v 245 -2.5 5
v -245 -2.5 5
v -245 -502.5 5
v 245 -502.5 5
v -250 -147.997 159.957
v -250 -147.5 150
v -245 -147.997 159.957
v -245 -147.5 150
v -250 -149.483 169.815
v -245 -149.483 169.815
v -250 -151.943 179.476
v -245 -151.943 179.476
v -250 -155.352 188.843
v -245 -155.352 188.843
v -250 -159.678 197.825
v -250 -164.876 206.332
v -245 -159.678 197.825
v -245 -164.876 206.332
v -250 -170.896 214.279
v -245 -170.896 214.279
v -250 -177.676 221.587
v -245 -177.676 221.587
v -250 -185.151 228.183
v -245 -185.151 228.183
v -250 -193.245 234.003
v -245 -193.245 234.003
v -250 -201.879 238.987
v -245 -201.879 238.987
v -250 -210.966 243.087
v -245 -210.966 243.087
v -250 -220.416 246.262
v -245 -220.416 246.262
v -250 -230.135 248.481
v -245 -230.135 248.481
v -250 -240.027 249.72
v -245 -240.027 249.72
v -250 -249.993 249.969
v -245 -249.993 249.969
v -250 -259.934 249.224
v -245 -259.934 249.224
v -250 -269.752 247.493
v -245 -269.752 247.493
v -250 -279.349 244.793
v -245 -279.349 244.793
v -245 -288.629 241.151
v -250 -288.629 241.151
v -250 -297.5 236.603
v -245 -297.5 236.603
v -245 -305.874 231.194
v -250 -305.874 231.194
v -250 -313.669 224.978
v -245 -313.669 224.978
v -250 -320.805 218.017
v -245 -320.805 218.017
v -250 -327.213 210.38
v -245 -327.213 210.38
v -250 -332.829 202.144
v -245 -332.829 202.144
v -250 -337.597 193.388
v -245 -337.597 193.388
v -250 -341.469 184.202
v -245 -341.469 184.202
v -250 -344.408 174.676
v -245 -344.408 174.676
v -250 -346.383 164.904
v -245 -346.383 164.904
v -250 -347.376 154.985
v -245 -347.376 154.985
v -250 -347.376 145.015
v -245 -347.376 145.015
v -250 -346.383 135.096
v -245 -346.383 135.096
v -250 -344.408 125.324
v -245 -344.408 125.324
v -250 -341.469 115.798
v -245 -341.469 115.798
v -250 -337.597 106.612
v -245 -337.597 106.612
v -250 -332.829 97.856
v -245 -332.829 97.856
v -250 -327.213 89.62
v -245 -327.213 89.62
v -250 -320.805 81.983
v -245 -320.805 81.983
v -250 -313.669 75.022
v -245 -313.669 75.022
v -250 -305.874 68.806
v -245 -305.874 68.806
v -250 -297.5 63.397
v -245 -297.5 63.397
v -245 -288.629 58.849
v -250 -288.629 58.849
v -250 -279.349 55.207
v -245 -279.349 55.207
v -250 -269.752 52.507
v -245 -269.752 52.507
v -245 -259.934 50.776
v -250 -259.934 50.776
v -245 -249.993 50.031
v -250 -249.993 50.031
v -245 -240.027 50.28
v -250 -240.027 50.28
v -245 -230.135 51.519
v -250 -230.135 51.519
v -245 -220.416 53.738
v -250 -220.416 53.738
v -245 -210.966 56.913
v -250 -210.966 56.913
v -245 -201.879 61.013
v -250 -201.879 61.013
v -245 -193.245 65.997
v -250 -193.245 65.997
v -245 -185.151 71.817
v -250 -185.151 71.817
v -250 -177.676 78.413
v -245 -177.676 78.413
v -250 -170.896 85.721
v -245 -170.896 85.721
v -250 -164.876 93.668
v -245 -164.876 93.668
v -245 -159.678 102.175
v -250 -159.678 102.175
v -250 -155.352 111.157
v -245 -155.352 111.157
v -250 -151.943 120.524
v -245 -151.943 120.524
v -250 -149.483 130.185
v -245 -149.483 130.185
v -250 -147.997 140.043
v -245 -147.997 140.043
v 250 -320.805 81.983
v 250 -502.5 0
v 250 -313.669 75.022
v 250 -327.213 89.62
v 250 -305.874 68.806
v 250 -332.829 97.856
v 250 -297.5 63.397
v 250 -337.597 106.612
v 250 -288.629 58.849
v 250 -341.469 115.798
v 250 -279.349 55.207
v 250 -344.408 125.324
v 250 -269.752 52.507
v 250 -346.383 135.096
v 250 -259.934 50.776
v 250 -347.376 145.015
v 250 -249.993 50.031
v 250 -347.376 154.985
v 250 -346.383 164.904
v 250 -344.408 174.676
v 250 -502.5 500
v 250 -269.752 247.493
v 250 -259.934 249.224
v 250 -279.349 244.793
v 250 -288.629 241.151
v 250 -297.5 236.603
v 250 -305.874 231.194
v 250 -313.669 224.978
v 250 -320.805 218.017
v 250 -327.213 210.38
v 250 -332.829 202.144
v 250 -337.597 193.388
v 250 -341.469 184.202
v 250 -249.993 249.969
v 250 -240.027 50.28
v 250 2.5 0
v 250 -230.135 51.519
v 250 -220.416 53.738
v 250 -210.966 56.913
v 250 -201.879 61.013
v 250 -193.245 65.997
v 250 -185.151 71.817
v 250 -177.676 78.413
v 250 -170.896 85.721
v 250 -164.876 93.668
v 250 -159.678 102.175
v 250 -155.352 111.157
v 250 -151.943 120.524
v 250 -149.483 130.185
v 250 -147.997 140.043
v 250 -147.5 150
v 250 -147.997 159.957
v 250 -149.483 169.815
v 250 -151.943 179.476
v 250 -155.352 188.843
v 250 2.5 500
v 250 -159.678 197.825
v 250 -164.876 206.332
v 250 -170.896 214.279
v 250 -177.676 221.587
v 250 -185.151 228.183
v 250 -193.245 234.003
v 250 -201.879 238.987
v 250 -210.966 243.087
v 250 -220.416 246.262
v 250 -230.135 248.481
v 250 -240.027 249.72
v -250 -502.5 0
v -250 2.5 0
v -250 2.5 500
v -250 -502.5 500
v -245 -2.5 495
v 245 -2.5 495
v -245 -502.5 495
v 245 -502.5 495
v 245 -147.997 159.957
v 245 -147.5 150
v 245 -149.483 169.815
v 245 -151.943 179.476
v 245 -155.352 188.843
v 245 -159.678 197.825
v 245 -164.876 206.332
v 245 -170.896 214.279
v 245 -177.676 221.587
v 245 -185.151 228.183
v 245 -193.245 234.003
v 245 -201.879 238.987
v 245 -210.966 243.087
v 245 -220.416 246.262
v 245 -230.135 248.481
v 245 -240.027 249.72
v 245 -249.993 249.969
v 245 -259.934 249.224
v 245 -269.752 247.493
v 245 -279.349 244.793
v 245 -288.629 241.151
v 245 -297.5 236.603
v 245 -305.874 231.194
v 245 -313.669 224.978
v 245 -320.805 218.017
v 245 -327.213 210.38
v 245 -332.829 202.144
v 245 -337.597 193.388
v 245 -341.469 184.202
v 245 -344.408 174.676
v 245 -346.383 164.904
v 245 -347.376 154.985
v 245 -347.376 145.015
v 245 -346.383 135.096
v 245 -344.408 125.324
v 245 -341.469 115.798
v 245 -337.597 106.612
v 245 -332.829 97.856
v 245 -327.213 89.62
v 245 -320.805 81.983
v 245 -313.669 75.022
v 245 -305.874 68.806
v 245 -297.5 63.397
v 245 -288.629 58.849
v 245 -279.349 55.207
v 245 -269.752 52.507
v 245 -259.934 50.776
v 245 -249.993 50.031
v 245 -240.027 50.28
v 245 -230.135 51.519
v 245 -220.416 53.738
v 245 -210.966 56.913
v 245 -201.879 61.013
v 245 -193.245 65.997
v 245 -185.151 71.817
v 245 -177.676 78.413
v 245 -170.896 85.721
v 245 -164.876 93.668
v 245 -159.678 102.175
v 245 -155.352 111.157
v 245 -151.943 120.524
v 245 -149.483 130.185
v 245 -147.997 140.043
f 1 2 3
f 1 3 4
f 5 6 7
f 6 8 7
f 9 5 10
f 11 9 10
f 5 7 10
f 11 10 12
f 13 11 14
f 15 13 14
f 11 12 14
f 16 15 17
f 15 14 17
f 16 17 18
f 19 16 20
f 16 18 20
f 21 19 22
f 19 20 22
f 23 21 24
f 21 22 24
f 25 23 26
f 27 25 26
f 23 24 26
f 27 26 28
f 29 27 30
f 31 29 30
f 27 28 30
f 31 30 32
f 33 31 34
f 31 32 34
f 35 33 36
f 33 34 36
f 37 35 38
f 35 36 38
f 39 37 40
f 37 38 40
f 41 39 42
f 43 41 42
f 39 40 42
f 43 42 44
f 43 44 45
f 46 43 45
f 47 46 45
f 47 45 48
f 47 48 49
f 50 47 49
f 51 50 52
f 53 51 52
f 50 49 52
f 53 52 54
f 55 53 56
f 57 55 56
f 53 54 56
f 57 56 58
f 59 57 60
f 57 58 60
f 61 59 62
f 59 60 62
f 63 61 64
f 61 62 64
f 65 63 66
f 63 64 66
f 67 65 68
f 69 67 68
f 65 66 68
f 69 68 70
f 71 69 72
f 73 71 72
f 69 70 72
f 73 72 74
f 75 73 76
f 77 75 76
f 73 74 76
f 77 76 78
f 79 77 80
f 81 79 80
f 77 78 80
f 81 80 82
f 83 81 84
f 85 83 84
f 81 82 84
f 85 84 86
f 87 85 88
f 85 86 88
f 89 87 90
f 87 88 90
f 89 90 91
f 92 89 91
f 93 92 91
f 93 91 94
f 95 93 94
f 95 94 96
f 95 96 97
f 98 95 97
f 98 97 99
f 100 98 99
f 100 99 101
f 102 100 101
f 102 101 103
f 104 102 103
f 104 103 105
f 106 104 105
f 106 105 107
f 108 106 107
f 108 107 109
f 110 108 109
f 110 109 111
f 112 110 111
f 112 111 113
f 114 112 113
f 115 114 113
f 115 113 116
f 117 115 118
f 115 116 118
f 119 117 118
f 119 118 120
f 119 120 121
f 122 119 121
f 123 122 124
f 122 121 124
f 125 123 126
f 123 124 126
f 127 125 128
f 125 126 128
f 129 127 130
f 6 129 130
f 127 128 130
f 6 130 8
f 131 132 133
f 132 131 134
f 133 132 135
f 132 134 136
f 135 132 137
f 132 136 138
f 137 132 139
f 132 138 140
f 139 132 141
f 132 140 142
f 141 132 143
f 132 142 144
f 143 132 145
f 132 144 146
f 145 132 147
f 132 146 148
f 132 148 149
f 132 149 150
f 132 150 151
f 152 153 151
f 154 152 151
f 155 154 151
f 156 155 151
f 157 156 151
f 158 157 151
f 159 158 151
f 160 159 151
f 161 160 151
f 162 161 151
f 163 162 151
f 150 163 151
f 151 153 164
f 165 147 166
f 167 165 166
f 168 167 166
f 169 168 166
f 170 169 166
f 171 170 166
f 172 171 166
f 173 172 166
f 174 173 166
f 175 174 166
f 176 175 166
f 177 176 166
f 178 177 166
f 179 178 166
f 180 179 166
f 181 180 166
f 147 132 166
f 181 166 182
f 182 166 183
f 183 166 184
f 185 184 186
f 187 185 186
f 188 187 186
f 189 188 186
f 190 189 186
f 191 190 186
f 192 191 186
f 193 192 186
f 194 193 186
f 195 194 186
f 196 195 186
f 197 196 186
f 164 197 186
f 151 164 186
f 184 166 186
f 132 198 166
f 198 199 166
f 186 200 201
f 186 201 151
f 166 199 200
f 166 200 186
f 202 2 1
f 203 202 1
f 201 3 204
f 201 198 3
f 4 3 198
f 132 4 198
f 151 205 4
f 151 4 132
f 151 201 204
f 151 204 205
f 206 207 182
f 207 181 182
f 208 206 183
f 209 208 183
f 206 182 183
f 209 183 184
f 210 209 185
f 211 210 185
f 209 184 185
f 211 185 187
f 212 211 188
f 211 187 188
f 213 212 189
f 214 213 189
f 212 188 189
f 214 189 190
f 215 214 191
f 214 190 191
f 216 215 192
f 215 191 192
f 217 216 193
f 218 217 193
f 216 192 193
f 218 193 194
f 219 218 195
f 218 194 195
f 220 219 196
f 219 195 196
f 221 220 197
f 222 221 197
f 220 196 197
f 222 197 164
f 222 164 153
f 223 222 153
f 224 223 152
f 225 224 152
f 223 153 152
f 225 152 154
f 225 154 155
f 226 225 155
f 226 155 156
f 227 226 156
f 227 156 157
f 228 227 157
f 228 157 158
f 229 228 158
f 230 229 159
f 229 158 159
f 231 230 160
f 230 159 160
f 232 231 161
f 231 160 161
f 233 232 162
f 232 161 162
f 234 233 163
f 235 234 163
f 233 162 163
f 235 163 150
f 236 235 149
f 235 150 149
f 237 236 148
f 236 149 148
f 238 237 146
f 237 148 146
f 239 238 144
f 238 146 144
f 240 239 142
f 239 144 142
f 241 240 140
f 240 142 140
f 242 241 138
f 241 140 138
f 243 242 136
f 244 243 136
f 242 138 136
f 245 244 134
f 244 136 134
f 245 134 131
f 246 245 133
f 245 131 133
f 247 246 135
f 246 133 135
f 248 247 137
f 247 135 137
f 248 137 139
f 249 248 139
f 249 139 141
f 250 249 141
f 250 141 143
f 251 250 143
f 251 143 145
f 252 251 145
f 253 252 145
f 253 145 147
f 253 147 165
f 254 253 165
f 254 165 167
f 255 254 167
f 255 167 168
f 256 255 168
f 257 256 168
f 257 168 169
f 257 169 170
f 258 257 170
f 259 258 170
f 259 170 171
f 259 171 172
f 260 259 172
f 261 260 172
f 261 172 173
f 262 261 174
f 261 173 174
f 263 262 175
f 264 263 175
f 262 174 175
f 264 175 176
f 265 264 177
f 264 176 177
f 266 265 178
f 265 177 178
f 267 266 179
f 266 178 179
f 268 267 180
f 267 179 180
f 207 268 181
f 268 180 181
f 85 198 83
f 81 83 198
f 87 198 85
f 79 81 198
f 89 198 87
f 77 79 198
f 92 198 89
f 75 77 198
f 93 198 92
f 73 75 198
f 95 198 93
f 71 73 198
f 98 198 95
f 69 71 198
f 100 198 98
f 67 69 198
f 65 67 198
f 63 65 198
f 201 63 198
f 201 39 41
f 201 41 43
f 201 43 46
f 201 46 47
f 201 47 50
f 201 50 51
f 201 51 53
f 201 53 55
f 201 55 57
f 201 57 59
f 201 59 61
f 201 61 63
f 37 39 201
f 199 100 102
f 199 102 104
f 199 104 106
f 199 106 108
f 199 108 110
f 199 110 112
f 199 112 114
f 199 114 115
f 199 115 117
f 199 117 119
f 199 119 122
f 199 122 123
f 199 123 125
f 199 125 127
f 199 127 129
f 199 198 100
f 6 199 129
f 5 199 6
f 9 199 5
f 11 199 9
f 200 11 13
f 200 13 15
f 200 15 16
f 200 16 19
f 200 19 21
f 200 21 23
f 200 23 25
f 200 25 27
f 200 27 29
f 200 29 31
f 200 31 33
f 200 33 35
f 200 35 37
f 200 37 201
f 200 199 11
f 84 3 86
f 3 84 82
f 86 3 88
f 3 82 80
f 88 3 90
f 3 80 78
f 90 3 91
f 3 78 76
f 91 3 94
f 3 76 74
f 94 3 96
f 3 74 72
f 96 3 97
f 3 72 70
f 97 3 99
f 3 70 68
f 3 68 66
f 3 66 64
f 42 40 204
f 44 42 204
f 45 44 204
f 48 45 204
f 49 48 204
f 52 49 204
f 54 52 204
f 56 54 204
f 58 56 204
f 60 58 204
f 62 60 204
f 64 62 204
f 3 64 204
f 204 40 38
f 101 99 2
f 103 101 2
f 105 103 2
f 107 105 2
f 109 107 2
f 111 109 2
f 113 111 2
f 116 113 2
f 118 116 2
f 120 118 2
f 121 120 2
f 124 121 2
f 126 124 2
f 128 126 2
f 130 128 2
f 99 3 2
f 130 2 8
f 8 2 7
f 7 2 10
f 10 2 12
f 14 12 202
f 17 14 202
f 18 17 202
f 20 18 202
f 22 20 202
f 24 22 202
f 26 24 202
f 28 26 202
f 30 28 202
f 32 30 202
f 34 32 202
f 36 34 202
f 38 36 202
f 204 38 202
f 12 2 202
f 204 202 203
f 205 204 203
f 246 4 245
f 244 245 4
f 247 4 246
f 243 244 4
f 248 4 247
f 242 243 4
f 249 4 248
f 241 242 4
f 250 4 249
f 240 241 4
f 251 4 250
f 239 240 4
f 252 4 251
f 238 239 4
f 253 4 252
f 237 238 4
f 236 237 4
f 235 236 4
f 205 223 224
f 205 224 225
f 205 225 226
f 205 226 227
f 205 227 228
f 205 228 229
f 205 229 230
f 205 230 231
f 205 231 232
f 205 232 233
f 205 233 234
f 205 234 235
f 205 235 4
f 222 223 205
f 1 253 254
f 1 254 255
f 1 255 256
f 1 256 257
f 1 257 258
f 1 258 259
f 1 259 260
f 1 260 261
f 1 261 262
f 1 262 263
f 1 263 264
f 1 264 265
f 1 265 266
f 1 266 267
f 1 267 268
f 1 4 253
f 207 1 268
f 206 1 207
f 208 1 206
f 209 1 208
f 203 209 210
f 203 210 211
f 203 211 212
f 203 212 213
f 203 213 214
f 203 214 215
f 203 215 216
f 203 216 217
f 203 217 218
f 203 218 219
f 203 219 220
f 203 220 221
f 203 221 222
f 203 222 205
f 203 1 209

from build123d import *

# Parameters (mm, degrees)
F0_W     = 500
F0_H     = 5
F1_DEPTH = 500
F2_W     = 500
F2_H     = 4.9999952316
F3_DEPTH = 500
F4_W     = 500
F4_H     = 5
F5_DEPTH = 500
F6_W     = 5
F6_H     = 490.0000047684
F6_W_2   = 4.9999952316
F7_DEPTH = 500
F8_R     = 100
F9_DEPTH = 301


with BuildPart() as f1:
    # F0 (on Top) → F1 (new body)
    with BuildSketch(Plane.XY):
        Rectangle(F0_W, F0_H)
    extrude(amount=F1_DEPTH)

    # F2 (on face) → F3 (join)
    with BuildSketch(Plane.XZ.offset(2.5)):
        with Locations((0, 497.5000023842)):
            Rectangle(F2_W, F2_H)
    extrude(amount=F3_DEPTH)

    # F4 (on face) → F5 (join)
    with BuildSketch(Plane.XZ.offset(2.5)):
        with Locations((0, 2.5)):
            Rectangle(F4_W, F4_H)
    extrude(amount=F5_DEPTH)

    # F6 (on face) → F7 (join)
    with BuildSketch(Plane.XZ.offset(2.5)):
        with Locations((247.5, 250.0000023842)):
            Rectangle(F6_W, F6_H)
        with Locations((-247.5000023842, 250.0000023842)):
            Rectangle(F6_W_2, F6_H)
    extrude(amount=F7_DEPTH)

    # F8 (on Right) → F9 (cut, symmetric)
    with BuildSketch(Plane.YZ):
        with Locations((-247.5, 150)):
            Circle(F8_R)
    extrude(amount=F9_DEPTH, both=True, mode=Mode.SUBTRACT)


solid = f1.part
